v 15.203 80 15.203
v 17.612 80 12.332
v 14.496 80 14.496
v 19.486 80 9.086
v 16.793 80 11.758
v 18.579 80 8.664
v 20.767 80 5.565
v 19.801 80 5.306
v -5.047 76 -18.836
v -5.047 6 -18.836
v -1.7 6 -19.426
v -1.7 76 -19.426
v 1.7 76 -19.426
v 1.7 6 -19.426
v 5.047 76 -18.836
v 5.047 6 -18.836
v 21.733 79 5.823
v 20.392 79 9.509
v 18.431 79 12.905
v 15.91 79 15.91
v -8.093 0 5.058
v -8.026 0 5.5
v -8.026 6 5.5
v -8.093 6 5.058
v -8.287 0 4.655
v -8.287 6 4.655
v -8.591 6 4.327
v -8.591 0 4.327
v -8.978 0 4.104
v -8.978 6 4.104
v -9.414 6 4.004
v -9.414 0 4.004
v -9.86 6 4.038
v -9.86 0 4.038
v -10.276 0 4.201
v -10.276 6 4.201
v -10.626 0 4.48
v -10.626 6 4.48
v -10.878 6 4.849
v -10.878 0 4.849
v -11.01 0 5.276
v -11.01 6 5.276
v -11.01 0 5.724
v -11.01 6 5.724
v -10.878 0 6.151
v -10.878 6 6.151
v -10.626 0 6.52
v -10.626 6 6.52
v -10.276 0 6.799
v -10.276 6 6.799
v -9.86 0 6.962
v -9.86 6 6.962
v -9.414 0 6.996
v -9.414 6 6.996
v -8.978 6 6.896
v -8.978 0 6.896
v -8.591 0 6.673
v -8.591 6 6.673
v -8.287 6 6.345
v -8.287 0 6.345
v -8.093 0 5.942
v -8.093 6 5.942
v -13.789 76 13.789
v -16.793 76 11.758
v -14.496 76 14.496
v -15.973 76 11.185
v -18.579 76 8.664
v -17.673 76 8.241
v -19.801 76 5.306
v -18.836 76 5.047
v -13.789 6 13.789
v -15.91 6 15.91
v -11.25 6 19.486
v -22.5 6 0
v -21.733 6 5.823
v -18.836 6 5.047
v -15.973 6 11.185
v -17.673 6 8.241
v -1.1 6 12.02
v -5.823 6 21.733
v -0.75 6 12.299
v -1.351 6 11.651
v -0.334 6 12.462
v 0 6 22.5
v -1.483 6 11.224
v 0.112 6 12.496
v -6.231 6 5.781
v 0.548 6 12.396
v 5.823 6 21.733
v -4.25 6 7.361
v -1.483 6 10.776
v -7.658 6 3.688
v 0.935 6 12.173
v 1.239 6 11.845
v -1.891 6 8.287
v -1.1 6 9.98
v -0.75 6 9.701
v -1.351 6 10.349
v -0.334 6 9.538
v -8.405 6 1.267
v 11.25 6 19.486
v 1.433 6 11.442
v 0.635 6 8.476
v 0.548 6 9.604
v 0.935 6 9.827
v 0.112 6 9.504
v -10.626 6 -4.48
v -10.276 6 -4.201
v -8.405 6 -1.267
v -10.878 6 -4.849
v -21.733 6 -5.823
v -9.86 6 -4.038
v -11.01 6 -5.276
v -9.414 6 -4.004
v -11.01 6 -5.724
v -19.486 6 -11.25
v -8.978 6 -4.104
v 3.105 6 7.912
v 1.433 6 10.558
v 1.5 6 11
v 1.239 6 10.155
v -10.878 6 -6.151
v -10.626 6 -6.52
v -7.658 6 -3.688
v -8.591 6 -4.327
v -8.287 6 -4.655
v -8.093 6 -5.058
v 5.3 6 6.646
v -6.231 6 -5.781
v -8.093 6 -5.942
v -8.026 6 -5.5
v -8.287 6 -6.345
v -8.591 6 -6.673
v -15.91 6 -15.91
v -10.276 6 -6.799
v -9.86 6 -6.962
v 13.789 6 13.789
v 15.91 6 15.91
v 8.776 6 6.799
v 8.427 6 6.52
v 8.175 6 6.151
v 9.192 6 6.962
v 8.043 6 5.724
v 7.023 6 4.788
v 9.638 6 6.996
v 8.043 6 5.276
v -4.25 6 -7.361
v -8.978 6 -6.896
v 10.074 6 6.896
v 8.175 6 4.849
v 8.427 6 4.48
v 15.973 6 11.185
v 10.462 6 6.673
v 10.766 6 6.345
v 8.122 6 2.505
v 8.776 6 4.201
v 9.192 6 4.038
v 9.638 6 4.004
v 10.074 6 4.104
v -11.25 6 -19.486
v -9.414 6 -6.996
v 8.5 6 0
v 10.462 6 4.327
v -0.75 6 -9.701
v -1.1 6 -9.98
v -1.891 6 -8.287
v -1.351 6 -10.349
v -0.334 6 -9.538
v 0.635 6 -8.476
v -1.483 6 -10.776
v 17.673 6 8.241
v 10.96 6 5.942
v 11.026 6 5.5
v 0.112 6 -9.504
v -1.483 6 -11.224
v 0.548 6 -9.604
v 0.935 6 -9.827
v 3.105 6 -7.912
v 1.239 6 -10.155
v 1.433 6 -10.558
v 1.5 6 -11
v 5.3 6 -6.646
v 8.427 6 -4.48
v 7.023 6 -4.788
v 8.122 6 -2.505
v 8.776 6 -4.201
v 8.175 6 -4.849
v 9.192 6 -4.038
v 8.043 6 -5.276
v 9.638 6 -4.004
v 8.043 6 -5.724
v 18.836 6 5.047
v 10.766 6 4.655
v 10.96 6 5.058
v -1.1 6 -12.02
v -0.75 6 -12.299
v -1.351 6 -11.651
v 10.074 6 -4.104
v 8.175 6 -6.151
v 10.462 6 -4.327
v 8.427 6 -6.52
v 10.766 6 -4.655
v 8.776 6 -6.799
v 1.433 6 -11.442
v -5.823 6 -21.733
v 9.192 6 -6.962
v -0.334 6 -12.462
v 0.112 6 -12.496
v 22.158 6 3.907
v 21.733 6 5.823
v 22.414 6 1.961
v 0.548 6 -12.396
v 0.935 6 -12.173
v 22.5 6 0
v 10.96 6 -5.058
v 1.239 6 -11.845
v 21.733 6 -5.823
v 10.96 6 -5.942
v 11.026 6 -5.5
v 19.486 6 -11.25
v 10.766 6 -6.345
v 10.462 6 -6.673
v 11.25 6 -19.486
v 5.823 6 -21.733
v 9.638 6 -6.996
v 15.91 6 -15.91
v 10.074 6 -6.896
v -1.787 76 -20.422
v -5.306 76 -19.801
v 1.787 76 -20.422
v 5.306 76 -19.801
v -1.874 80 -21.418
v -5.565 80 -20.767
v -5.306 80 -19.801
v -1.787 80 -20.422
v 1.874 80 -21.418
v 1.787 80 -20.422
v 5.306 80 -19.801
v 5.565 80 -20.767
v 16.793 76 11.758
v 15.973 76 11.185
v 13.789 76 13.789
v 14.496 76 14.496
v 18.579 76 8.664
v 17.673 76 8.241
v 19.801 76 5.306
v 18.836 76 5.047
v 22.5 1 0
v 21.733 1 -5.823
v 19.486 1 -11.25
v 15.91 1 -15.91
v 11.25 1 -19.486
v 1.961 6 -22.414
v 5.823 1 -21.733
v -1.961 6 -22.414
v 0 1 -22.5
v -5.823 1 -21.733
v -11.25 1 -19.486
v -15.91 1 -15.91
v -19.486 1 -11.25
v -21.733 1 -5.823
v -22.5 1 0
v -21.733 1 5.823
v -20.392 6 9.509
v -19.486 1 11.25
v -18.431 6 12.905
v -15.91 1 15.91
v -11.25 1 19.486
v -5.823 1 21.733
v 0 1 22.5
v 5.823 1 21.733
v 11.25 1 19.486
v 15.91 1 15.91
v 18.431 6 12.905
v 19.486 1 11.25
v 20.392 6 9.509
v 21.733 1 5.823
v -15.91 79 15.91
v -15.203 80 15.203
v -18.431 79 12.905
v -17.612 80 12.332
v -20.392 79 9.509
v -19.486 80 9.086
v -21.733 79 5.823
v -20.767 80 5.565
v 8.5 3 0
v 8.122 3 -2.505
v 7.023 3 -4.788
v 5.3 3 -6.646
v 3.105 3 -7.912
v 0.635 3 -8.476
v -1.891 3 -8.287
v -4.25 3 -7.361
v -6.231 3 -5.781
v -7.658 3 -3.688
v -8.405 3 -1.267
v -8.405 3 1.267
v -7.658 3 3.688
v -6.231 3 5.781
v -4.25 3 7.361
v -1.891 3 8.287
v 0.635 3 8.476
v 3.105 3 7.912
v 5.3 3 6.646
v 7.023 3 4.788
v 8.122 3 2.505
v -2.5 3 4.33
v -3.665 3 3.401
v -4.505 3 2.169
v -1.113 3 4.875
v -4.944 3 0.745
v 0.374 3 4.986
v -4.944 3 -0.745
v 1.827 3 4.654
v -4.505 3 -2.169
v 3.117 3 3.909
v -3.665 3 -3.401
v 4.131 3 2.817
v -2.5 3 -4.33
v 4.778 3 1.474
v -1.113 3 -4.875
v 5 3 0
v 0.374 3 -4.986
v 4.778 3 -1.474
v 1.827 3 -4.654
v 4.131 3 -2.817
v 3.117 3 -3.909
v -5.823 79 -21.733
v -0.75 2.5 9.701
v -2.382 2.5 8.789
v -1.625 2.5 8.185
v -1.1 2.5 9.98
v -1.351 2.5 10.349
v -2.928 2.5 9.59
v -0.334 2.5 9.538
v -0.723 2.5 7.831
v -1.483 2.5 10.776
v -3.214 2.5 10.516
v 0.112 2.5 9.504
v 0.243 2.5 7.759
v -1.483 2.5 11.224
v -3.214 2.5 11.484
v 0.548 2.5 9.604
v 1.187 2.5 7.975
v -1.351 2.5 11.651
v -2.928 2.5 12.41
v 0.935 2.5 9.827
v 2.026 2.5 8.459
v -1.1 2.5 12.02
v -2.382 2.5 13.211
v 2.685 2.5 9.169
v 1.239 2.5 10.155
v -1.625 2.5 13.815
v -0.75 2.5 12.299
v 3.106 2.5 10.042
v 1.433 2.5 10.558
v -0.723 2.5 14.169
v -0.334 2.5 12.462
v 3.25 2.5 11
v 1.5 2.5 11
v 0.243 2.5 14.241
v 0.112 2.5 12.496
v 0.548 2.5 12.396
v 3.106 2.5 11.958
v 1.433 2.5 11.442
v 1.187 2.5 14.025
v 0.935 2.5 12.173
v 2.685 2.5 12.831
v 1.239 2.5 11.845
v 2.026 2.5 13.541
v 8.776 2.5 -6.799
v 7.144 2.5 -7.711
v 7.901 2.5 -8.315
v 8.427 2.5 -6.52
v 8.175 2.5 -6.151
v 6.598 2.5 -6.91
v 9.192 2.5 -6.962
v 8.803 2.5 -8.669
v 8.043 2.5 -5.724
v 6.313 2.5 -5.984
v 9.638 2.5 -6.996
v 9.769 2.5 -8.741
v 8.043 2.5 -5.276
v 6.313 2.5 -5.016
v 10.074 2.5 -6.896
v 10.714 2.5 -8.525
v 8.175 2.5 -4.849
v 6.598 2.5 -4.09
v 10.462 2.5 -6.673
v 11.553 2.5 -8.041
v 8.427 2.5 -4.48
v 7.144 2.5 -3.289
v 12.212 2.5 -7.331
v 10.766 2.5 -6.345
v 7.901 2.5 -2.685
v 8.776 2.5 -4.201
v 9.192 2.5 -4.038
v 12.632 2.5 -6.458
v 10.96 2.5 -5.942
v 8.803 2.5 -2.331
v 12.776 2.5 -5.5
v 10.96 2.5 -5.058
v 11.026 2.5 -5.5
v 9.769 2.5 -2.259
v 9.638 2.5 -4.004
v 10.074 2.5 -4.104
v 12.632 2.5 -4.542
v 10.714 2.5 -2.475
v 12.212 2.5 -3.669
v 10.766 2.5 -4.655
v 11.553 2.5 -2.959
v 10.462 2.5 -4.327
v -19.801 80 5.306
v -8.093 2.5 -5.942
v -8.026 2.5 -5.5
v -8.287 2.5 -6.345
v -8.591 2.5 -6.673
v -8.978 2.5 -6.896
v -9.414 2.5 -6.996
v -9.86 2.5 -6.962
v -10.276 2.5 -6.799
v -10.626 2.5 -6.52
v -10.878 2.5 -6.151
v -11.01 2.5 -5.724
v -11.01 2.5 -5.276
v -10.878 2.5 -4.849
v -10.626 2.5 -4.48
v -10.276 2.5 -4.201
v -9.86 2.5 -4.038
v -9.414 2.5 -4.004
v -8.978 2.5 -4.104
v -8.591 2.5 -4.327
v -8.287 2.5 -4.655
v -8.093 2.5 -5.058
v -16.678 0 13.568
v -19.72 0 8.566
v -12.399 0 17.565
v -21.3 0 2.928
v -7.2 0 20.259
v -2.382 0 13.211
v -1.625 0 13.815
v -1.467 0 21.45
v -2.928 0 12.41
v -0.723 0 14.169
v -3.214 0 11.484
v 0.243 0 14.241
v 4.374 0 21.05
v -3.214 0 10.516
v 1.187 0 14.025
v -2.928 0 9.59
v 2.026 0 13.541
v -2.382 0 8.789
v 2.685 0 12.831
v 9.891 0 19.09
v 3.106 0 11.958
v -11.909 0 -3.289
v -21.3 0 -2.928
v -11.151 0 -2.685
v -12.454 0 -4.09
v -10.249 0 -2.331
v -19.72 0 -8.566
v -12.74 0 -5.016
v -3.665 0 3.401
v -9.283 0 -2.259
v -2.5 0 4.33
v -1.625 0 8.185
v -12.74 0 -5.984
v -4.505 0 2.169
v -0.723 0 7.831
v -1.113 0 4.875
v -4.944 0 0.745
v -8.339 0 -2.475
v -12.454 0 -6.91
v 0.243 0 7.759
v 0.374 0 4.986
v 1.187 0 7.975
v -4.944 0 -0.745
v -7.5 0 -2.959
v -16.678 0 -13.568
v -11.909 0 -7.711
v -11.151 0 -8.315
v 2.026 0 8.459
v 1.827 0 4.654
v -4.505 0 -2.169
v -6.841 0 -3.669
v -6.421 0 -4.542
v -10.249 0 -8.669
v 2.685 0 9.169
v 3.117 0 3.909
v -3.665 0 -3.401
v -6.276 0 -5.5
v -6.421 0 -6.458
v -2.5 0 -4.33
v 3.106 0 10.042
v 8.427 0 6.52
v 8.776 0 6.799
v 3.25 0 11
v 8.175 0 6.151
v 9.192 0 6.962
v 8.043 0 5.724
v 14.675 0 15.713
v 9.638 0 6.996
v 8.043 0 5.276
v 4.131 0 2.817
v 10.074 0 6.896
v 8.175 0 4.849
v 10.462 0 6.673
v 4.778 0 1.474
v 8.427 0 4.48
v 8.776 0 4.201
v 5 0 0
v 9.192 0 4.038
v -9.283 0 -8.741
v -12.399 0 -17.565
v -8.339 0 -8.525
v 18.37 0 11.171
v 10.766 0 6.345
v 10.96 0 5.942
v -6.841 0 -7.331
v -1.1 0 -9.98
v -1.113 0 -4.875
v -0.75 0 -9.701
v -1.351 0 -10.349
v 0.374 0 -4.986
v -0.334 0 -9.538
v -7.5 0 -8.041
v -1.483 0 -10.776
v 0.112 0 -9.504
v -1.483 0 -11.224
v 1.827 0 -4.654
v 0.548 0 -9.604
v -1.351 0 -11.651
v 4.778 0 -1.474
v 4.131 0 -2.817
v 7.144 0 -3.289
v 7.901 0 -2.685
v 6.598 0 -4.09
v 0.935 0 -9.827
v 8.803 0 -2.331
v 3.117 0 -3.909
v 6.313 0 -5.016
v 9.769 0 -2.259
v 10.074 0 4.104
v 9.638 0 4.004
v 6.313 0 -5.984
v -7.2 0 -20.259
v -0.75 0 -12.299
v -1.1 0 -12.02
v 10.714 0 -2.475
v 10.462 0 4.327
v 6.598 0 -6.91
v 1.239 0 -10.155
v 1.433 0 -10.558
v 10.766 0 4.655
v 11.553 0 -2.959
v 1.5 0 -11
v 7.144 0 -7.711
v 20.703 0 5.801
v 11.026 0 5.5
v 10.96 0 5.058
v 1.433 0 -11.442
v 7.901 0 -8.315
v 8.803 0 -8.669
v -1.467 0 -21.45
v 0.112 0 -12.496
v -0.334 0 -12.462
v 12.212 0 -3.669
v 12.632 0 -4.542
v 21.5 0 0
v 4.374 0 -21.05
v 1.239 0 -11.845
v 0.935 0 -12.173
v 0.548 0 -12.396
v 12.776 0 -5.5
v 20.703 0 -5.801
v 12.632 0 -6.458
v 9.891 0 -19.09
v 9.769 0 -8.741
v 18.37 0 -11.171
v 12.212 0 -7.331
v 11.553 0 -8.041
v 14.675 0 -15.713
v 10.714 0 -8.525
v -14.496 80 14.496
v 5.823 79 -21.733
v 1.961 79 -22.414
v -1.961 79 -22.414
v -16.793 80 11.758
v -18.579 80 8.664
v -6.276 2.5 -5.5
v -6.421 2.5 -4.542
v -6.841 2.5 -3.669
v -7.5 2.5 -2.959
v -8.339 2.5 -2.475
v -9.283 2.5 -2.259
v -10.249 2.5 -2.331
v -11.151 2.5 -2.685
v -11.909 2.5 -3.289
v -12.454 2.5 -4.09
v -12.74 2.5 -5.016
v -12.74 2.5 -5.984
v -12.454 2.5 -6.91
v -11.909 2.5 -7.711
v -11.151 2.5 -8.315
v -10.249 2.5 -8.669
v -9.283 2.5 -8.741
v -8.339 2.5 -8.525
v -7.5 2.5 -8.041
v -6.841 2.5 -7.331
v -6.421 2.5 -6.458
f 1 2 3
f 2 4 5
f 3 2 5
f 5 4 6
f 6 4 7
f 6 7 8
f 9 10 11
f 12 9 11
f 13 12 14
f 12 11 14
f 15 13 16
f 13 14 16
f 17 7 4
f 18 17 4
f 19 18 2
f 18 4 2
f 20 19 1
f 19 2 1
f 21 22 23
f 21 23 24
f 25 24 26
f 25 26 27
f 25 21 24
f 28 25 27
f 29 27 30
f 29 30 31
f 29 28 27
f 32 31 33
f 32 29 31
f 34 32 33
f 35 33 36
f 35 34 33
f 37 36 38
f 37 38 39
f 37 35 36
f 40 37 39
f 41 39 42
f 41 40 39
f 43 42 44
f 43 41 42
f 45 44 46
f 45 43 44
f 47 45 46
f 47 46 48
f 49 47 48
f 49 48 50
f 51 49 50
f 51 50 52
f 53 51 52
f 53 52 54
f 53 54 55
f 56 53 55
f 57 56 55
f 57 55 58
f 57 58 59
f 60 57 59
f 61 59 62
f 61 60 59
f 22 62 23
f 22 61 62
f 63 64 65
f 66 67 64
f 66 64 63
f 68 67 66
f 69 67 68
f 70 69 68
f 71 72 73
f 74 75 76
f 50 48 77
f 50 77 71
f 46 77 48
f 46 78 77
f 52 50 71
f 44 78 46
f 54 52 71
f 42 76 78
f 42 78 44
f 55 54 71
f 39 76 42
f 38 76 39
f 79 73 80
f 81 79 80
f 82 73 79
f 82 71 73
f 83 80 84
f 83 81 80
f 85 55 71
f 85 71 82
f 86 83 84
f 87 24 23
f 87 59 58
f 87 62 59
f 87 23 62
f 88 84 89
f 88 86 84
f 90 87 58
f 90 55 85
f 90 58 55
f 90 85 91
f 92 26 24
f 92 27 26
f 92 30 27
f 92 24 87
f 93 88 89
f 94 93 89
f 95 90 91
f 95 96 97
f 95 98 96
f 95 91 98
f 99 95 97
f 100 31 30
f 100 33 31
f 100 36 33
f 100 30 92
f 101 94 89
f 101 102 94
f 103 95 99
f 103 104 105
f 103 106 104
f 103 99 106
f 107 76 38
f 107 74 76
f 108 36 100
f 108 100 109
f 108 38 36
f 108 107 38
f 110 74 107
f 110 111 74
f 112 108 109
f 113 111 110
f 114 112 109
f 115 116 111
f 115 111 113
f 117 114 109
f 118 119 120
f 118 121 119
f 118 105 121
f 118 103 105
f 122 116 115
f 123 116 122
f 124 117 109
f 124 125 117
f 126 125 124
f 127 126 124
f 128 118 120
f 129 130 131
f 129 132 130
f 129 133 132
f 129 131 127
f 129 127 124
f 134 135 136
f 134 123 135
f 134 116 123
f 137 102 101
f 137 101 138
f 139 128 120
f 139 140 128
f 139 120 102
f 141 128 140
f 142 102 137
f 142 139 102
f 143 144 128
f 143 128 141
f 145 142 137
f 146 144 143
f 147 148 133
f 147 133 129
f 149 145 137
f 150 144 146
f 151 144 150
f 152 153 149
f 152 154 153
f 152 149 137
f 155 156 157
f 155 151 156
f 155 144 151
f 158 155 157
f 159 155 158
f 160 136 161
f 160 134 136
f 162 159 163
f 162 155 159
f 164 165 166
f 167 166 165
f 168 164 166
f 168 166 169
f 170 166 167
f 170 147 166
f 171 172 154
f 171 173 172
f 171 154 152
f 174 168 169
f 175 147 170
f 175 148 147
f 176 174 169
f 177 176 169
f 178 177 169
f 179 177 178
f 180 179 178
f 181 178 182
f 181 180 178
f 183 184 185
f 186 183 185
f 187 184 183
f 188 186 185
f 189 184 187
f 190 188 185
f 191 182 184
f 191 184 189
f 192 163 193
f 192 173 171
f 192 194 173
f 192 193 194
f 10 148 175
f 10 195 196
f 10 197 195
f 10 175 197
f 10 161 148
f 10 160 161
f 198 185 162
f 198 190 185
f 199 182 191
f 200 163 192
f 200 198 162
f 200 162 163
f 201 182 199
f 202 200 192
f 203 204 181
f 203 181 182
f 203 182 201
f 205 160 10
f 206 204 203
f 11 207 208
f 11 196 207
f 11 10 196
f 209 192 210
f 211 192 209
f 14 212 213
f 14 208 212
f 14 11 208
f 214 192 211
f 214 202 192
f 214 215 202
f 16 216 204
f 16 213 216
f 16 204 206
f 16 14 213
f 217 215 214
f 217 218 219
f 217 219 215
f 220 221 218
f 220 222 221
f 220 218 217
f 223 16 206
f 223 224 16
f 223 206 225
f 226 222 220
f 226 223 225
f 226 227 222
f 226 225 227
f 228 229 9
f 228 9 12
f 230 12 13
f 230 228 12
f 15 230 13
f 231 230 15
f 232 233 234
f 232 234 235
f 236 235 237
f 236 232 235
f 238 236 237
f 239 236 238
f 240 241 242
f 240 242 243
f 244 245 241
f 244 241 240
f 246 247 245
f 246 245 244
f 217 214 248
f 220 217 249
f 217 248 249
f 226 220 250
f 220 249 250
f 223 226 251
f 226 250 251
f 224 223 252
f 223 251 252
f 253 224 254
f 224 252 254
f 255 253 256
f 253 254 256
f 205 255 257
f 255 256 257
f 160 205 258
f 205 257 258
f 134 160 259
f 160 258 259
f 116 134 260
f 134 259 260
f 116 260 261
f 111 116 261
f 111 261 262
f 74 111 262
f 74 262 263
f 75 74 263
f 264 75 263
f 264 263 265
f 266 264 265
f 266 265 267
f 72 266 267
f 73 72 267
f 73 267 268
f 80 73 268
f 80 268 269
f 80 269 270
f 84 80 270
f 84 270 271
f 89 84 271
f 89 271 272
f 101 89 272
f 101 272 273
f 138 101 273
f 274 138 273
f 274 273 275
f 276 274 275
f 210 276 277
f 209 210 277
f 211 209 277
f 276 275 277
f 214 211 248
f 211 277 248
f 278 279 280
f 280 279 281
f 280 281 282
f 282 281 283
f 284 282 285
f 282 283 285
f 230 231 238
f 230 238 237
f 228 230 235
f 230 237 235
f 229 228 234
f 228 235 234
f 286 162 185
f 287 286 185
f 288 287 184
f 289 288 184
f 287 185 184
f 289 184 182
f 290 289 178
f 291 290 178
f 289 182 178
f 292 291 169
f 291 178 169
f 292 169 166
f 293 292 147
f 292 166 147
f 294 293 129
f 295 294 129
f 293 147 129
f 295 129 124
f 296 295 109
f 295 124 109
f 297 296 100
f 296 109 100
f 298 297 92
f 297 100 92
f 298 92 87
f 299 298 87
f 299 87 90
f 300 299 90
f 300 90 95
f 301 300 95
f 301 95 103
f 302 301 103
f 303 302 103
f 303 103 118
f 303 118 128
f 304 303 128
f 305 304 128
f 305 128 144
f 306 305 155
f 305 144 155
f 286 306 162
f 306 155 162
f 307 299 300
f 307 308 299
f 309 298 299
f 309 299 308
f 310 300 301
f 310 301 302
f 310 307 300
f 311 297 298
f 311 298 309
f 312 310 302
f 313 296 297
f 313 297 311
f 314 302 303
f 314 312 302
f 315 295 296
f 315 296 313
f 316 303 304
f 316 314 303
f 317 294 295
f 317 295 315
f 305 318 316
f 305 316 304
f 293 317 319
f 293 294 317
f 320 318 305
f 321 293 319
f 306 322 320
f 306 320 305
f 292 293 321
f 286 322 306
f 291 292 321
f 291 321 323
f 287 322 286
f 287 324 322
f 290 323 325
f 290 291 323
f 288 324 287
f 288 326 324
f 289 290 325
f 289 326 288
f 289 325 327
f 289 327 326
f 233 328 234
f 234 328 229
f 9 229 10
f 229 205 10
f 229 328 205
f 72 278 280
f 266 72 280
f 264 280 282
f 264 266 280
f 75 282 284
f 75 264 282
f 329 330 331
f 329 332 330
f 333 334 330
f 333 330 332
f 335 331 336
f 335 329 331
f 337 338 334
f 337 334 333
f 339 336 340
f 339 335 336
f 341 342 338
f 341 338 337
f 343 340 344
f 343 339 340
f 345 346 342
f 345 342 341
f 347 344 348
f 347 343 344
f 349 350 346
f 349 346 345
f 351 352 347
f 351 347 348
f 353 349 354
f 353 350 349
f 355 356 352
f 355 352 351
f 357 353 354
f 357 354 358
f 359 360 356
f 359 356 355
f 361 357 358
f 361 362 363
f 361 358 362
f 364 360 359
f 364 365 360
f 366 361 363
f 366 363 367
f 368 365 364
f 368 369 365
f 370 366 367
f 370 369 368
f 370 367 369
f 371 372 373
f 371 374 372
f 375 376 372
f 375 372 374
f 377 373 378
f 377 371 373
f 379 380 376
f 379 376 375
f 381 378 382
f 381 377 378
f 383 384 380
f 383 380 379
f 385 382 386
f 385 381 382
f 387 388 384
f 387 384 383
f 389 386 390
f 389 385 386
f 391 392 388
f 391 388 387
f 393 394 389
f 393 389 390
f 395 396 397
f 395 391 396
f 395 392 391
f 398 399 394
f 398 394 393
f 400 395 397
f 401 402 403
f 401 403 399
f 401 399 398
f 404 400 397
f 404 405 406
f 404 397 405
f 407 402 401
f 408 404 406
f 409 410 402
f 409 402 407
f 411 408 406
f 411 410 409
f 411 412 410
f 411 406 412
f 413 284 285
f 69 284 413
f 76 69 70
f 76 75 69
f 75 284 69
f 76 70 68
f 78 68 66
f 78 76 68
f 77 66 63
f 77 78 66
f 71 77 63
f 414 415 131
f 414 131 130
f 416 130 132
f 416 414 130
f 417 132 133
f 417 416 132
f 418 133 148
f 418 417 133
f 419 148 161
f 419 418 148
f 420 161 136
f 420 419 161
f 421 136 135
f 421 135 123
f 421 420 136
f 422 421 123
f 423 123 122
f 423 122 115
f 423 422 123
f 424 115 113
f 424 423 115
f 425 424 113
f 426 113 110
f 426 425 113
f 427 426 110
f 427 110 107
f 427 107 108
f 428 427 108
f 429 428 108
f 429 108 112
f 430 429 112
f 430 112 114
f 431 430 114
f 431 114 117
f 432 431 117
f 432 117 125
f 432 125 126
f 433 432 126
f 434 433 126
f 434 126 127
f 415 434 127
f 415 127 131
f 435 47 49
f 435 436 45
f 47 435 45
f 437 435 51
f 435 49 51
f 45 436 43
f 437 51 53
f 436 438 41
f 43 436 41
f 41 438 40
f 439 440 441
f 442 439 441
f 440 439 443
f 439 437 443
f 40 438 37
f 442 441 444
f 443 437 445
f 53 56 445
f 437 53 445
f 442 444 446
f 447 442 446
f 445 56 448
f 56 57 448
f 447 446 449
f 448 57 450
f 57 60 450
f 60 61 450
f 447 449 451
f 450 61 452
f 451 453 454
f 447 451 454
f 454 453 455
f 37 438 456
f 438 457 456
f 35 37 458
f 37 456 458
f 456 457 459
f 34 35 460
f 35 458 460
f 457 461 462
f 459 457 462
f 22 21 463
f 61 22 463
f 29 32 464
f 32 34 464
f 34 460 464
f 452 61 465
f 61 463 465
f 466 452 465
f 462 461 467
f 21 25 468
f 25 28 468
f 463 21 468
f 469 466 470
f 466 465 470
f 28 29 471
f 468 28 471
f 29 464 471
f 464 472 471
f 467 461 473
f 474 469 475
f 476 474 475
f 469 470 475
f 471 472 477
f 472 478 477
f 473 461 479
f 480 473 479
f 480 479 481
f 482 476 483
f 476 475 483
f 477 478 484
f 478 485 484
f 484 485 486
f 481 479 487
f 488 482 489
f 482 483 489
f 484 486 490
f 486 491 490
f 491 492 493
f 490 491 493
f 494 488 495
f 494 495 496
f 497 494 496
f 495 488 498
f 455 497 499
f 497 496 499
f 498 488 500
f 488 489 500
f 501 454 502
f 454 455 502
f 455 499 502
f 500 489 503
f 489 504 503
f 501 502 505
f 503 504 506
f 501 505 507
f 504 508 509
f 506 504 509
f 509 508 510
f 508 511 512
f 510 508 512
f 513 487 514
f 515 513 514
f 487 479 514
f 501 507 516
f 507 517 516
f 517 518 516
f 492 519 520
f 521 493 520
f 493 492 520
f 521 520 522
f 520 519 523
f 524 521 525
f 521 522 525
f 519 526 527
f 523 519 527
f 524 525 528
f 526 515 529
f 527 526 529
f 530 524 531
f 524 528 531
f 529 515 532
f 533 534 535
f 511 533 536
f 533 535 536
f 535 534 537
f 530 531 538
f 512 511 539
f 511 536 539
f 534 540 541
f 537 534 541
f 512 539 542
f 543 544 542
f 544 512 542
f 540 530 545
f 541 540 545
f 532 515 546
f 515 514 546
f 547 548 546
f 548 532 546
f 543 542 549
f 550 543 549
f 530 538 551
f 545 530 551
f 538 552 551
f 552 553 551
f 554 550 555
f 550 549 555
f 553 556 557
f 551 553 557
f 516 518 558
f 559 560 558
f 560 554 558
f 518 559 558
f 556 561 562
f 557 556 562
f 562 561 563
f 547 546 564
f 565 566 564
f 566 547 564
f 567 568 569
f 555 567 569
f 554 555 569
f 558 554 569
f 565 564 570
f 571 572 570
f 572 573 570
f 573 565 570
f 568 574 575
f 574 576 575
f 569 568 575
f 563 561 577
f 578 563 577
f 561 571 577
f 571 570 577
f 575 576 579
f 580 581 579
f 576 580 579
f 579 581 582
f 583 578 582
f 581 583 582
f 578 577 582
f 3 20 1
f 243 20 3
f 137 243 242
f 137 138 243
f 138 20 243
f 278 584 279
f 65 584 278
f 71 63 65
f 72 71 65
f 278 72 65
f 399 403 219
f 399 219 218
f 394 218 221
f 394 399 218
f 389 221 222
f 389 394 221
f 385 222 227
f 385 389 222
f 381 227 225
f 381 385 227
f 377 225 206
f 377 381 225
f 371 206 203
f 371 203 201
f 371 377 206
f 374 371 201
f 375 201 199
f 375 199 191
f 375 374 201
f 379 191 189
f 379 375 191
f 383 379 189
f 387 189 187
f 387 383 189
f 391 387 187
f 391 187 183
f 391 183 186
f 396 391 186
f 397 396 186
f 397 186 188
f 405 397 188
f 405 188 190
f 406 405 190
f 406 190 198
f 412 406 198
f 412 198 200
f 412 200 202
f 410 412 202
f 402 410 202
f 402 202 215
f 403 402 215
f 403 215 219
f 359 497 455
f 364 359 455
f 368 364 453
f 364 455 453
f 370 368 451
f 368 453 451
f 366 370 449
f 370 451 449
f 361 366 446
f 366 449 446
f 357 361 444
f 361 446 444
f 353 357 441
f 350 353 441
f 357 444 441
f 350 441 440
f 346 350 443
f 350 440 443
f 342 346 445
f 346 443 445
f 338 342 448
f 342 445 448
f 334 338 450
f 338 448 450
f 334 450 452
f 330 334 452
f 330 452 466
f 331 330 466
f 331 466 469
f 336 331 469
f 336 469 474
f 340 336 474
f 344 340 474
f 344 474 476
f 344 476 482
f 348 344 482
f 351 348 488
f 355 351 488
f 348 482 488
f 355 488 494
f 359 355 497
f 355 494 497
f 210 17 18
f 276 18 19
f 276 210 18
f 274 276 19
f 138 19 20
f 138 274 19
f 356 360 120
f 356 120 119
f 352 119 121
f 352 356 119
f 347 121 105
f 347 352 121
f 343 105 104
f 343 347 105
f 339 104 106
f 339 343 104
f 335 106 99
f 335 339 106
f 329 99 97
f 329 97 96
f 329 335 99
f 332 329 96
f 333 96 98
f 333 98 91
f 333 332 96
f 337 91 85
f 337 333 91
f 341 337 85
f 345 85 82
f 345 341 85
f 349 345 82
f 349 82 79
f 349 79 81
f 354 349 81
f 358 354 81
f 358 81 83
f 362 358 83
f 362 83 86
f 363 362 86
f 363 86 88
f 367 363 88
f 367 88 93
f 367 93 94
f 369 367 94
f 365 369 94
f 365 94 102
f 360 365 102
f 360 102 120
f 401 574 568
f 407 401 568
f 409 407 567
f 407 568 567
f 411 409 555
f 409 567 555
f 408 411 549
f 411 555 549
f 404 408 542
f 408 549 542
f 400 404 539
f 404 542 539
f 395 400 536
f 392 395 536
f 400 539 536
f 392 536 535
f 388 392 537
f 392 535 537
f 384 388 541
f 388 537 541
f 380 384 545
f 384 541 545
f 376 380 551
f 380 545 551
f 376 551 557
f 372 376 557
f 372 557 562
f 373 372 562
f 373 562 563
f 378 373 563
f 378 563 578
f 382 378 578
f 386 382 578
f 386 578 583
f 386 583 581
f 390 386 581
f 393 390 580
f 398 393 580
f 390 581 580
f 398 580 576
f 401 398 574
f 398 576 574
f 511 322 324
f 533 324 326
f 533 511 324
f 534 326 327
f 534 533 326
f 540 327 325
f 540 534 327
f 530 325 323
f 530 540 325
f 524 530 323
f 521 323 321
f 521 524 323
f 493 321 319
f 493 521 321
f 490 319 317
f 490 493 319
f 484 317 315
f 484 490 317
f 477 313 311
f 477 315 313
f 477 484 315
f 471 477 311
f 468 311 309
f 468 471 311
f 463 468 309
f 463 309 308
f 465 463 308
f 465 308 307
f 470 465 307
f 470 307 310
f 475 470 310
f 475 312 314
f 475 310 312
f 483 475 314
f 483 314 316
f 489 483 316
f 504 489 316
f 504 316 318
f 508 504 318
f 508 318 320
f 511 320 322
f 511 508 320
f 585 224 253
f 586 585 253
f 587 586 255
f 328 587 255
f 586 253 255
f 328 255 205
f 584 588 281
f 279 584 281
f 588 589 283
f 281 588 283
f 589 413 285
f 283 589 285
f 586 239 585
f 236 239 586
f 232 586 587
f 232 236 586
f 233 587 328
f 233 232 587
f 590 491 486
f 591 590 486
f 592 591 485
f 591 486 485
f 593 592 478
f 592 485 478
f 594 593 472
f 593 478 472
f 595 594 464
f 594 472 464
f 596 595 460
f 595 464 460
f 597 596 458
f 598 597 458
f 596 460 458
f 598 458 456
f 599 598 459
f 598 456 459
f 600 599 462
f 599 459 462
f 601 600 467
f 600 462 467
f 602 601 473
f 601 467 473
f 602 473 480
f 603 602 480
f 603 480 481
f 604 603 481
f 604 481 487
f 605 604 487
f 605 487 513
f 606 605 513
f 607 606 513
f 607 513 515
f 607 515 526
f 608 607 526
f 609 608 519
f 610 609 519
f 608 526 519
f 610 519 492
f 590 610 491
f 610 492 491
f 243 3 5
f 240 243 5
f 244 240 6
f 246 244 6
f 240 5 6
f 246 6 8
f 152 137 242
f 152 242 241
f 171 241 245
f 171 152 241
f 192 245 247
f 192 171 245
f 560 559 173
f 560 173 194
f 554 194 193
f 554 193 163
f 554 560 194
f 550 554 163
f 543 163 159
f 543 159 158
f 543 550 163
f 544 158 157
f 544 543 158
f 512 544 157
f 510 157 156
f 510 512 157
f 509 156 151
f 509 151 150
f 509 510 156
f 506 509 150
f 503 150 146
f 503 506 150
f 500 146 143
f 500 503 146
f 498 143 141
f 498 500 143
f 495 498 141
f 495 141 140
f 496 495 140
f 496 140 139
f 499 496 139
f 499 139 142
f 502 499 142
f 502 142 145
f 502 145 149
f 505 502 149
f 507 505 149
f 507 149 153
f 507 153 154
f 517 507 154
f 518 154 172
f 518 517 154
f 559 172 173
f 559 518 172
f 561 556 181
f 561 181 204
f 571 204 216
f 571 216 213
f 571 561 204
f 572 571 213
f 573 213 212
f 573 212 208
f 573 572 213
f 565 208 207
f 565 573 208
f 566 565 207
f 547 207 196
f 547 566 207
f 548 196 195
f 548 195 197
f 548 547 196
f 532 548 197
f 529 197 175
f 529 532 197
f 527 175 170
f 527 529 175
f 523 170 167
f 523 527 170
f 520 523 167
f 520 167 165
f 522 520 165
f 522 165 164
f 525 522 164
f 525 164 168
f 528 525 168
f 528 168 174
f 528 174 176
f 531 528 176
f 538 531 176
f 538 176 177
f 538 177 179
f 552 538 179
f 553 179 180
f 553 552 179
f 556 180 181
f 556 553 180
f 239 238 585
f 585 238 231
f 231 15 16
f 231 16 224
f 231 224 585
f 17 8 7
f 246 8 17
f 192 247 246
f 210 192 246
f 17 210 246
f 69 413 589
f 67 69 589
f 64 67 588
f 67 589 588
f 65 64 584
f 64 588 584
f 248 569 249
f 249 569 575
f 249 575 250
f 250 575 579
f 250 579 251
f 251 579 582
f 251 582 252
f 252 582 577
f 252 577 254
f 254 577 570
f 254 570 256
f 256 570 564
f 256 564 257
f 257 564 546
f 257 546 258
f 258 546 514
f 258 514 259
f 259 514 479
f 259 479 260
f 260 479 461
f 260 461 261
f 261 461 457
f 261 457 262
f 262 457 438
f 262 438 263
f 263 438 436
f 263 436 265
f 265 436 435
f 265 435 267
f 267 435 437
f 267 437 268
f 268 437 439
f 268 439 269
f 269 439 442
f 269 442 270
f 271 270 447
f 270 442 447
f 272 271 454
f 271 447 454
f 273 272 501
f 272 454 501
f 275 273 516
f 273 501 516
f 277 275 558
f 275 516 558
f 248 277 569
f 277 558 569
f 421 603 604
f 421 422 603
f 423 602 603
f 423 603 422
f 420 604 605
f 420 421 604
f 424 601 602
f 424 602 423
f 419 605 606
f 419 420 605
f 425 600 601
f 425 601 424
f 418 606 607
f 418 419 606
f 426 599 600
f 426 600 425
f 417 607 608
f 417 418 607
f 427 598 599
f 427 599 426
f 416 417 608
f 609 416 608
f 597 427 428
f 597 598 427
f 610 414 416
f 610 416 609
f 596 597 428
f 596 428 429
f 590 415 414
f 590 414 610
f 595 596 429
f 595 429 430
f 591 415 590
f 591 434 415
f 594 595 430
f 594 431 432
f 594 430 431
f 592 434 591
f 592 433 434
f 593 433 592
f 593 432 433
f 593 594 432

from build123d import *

# Parameters (mm, degrees)
SKETCH1_R           = 22.5
SKETCH1_R_2         = 1.5
SKETCH1_R_3         = 5
BOSS_EXTRUDE1_DEPTH = 6
SKETCH4_R           = 8.5
CUT_EXTRUDE2_DEPTH  = 3
SKETCH6_R           = 3.25
CUT_EXTRUDE3_DEPTH  = 2.5
BOSS_EXTRUDE2_DEPTH = 74
SKETCH7_R           = 20.5
CUT_EXTRUDE4_DEPTH  = 4
CHAMFER2_SIZE       = 1


with BuildPart() as part:
    # Sketch1 → Boss-Extrude1 (new body)
    with BuildSketch(Plane(origin=(0, 0, 0), x_dir=(1, 0, 0), z_dir=(0, 1, 0))):
        Circle(SKETCH1_R)
        with Locations((0, 11)):
            Circle(SKETCH1_R_2, mode=Mode.SUBTRACT)
        with Locations((9.526279442, 5.5)):
            Circle(SKETCH1_R_2, mode=Mode.SUBTRACT)
        with Locations((9.526279442, -5.5)):
            Circle(SKETCH1_R_2, mode=Mode.SUBTRACT)
        with Locations((0, -11)):
            Circle(SKETCH1_R_2, mode=Mode.SUBTRACT)
        with Locations((-9.526279442, -5.5)):
            Circle(SKETCH1_R_2, mode=Mode.SUBTRACT)
        with Locations((-9.526279442, 5.5)):
            Circle(SKETCH1_R_2, mode=Mode.SUBTRACT)
        Circle(SKETCH1_R_3, mode=Mode.SUBTRACT)
    extrude(amount=BOSS_EXTRUDE1_DEPTH)

    # Sketch4 → Cut-Extrude2 (cut)
    with BuildSketch(Plane(origin=(0, 6, 0), x_dir=(1, 0, 0), z_dir=(0, 1, 0))):
        Circle(SKETCH4_R)
    extrude(amount=-CUT_EXTRUDE2_DEPTH, mode=Mode.SUBTRACT)

    # Sketch6 → Cut-Extrude3 (cut)
    with BuildSketch(Plane.XZ):
        with Locations((0, 11)):
            Circle(SKETCH6_R)
        with Locations((9.526279442, -5.5)):
            Circle(SKETCH6_R)
        with Locations((-9.526279442, -5.5)):
            Circle(SKETCH6_R)
    extrude(amount=-CUT_EXTRUDE3_DEPTH, mode=Mode.SUBTRACT)

    # Sketch2 → Boss-Extrude2 (add)
    with BuildSketch(Plane(origin=(0, 6, 0), x_dir=(1, 0, 0), z_dir=(0, 1, 0))):
        with BuildLine():
            Line((5.046971379, 18.835553613), (5.823428515, 21.733331092))
            ThreePointArc((5.823428515, 21.733331092), (0, 22.5), (-5.823428515, 21.733331092))
            Line((-5.823428515, 21.733331092), (-5.046971379, 18.835553613))
            ThreePointArc((-5.046971379, 18.835553613), (0, 19.5), (5.046971379, 18.835553613))
        make_face()
        with BuildLine():
            Line((18.835553613, -5.046971379), (21.733331092, -5.823428515))
            ThreePointArc((21.733331092, -5.823428515), (19.485571585, -11.25), (15.909902577, -15.909902577))
            Line((15.909902577, -15.909902577), (13.788582233, -13.788582233))
            ThreePointArc((13.788582233, -13.788582233), (16.887495374, -9.75), (18.835553613, -5.046971379))
        make_face()
        with BuildLine():
            Line((-13.788582233, -13.788582233), (-15.909902577, -15.909902577))
            ThreePointArc((-15.909902577, -15.909902577), (-19.485571585, -11.25), (-21.733331092, -5.823428515))
            Line((-21.733331092, -5.823428515), (-18.835553613, -5.046971379))
            ThreePointArc((-18.835553613, -5.046971379), (-16.887495374, -9.75), (-13.788582233, -13.788582233))
        make_face()
    extrude(amount=BOSS_EXTRUDE2_DEPTH)

    # Sketch7 → Cut-Extrude4 (cut)
    with BuildSketch(Plane(origin=(0, 80, 0), x_dir=(1, 0, 0), z_dir=(0, 1, 0))):
        Circle(SKETCH7_R)
    extrude(amount=-CUT_EXTRUDE4_DEPTH, mode=Mode.SUBTRACT)

    # Chamfer2
    chamfer2_edges = [part.edges().sort_by_distance(p)[0] for p in [
        (-22.5, 0, 0),
        (19.485571585, 80, 11.25),
        (0, 80, -22.5),
        (-19.485571585, 80, 11.25),
    ]]
    chamfer(chamfer2_edges, length=CHAMFER2_SIZE)


solid = part.part
